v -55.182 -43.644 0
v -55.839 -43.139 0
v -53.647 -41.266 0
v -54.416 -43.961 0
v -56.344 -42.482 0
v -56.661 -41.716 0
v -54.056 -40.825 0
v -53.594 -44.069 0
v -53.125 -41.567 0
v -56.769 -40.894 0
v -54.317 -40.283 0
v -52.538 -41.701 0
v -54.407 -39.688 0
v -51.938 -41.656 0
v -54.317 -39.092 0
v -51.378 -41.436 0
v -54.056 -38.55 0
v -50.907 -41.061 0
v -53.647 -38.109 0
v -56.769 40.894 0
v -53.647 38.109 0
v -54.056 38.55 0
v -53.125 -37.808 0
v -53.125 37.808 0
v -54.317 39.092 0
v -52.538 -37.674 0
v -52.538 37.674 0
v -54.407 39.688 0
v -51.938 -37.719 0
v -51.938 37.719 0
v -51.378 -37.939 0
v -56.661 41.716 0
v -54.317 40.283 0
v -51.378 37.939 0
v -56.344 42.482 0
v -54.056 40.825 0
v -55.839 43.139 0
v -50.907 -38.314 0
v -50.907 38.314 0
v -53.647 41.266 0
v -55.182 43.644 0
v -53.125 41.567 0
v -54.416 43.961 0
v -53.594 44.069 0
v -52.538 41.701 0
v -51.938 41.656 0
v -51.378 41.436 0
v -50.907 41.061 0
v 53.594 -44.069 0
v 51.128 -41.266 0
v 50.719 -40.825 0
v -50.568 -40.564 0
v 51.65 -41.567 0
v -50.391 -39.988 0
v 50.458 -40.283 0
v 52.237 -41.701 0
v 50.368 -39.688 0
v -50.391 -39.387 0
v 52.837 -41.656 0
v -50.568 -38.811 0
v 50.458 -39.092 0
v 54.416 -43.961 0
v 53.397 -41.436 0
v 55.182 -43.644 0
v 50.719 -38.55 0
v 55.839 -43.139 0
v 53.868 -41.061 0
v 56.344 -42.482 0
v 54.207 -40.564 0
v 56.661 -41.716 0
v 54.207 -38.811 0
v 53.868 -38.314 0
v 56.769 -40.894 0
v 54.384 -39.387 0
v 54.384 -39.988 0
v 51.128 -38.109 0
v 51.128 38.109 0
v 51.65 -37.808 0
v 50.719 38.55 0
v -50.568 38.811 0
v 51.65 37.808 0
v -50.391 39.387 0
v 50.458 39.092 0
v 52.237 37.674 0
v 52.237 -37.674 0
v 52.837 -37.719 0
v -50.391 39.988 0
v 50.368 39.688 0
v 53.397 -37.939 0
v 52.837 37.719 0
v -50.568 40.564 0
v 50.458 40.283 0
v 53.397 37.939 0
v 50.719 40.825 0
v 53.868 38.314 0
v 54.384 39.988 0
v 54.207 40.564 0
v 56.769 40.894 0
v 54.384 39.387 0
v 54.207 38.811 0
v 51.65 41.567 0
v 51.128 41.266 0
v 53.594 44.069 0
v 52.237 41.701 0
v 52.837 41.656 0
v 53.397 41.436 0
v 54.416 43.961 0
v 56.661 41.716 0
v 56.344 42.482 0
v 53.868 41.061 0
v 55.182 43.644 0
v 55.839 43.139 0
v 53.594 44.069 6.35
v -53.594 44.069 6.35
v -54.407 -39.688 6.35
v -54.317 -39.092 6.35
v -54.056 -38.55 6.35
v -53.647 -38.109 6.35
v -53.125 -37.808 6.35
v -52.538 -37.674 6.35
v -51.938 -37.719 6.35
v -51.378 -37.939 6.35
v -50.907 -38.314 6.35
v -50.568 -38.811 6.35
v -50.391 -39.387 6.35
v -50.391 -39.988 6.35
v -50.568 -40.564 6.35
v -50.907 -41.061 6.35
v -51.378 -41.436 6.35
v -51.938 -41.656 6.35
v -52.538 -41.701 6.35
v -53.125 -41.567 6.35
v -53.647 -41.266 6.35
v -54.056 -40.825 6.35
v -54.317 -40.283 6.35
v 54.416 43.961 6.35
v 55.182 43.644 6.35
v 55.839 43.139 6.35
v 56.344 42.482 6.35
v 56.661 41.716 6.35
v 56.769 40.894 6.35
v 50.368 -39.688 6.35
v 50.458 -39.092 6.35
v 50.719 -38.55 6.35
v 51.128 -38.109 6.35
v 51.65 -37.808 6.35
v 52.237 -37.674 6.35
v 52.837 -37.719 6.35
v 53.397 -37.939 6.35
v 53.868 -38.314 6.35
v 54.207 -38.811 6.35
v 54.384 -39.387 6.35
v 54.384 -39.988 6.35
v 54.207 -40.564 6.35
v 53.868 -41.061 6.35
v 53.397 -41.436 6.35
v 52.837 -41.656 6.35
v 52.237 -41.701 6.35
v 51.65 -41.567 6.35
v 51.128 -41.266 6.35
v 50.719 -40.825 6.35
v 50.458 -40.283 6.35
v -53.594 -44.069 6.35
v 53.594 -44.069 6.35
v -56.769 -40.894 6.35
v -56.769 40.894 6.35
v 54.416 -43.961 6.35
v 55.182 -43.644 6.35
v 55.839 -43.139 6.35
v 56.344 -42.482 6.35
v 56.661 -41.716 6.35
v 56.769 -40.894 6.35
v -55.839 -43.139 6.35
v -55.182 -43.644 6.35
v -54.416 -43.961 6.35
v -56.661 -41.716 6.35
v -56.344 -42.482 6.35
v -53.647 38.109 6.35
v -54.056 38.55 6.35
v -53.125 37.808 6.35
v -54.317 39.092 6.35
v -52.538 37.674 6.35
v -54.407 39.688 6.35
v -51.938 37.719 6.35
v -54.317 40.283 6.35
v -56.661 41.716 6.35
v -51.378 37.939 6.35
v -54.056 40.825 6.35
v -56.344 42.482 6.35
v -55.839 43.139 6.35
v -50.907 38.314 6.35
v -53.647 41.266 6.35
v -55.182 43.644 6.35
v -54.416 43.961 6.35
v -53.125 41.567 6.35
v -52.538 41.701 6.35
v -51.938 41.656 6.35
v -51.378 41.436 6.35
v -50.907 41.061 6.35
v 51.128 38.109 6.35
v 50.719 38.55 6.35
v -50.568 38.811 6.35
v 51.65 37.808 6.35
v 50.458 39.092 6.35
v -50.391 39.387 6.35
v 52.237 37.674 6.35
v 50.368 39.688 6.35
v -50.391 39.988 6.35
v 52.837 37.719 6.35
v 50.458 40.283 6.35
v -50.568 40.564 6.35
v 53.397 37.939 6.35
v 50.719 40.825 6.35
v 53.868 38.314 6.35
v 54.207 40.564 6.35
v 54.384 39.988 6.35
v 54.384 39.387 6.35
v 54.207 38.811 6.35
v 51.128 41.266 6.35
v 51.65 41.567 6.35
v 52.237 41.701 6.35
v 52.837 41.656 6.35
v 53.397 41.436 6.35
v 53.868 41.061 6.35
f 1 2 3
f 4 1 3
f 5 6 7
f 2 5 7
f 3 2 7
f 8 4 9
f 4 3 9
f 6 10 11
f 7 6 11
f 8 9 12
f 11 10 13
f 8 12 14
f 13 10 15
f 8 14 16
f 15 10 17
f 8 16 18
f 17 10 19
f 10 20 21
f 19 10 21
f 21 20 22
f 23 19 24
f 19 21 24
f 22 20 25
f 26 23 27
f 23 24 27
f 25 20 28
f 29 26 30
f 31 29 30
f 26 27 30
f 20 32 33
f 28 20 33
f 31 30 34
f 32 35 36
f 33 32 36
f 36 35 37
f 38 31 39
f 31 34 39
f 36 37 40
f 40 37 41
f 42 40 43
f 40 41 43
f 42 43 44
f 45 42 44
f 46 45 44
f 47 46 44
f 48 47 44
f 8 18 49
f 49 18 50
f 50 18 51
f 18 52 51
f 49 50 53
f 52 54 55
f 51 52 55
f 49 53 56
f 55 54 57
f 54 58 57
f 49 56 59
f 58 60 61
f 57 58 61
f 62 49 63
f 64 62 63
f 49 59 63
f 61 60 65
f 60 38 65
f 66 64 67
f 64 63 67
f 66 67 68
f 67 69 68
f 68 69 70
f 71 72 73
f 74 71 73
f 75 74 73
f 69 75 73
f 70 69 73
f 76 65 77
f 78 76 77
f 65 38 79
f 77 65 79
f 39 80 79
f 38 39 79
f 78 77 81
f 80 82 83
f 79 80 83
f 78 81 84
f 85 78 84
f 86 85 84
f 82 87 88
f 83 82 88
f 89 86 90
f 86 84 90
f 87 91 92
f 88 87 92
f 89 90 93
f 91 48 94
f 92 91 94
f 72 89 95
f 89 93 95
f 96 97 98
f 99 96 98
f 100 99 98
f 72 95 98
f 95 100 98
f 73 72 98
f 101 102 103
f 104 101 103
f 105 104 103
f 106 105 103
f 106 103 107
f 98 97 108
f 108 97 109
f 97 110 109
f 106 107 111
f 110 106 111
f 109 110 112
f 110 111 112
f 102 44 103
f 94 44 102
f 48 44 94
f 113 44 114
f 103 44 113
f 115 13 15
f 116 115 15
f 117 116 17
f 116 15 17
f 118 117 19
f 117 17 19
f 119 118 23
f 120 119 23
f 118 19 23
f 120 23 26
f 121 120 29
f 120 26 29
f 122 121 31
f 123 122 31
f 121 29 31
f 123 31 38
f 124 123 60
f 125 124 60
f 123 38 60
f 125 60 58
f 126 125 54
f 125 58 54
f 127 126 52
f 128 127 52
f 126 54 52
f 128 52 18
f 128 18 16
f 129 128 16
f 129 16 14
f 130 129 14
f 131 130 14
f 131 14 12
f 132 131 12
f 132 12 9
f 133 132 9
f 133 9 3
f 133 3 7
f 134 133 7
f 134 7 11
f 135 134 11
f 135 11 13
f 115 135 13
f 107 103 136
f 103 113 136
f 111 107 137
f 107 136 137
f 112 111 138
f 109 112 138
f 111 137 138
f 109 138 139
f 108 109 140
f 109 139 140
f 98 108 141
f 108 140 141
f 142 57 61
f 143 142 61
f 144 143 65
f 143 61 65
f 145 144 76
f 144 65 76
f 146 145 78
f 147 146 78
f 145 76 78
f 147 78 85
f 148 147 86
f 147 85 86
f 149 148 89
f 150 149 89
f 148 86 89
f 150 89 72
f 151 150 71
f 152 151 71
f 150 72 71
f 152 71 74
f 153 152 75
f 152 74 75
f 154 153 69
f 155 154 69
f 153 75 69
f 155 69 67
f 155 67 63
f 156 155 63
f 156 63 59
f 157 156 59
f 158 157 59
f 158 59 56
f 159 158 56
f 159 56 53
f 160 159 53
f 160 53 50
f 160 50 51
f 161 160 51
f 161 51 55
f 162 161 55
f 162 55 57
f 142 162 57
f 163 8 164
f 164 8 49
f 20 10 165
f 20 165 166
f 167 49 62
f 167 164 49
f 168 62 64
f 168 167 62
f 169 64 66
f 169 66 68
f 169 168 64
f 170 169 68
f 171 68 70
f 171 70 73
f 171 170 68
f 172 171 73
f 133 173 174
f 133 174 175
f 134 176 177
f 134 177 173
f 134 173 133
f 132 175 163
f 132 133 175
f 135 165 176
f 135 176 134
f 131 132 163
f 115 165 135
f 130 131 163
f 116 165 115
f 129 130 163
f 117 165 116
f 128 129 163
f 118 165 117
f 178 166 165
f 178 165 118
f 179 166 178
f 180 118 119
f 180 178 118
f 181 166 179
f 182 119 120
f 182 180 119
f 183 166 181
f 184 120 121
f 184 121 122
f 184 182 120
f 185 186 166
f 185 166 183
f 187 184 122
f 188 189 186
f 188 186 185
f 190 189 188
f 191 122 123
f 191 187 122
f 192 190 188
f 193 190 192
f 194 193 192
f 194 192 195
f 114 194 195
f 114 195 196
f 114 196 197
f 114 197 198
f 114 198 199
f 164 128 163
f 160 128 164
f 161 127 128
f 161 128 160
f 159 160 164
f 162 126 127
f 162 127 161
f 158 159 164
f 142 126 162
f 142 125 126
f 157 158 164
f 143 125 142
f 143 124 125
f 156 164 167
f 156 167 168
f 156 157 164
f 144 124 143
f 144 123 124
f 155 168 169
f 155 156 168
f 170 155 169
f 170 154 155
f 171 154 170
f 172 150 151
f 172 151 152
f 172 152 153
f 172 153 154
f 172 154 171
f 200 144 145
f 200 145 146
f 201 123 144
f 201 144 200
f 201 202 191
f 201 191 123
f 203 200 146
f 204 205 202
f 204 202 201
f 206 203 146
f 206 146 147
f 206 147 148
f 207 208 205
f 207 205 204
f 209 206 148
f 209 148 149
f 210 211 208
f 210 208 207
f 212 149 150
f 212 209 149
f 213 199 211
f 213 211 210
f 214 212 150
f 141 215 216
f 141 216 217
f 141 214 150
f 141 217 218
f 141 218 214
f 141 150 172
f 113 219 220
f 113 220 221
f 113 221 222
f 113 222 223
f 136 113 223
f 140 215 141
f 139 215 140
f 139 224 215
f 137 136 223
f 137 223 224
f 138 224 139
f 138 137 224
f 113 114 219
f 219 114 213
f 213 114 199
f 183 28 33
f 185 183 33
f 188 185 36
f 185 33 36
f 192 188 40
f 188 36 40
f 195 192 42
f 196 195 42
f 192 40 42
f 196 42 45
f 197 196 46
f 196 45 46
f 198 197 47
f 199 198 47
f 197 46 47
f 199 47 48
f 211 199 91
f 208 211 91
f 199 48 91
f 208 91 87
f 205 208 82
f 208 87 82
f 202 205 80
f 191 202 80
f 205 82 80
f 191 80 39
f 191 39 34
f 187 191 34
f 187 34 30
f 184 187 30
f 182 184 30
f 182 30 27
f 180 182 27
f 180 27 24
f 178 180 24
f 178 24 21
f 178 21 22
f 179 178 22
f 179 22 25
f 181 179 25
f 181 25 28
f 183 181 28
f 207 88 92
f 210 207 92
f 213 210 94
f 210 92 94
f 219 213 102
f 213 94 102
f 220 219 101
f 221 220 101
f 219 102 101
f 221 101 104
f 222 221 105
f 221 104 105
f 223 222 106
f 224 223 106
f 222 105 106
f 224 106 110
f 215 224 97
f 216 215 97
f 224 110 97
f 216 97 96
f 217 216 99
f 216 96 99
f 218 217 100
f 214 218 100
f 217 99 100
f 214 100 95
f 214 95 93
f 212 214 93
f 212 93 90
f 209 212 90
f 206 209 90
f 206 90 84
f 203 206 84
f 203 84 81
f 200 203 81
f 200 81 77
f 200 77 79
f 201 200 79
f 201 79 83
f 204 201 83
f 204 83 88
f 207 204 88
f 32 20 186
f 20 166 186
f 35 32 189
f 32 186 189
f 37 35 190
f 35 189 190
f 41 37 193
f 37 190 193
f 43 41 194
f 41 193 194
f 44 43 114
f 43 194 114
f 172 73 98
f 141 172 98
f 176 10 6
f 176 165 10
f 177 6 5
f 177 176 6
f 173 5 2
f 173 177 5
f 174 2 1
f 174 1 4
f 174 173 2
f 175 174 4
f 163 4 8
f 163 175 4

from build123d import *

# Parameters (mm, degrees)
SKETCH1_W                 = 113.538
SKETCH1_H                 = 88.138
EXTRUDE1_DEPTH            = 6.35
F_8_CLEARANCE_HOLE1_D     = 4.0386
F_8_CLEARANCE_HOLE1_DEPTH = 6.35
FILLET2_R                 = 3.175


with BuildPart() as part:
    # Sketch1 → Extrude1 (new body)
    with BuildSketch(Plane.XY):
        Rectangle(SKETCH1_W, SKETCH1_H)
    extrude(amount=EXTRUDE1_DEPTH)

    # #8 Clearance Hole1
    with Locations(Plane(origin=(-52.3875, 39.6875, 6.35), x_dir=(1, 0, 0), z_dir=(0, 0, 1))):
        with Locations((0, 0), (104.775, 0), (104.775, -79.375), (0, -79.375)):
            Hole(F_8_CLEARANCE_HOLE1_D / 2, depth=F_8_CLEARANCE_HOLE1_DEPTH)

    # Fillet2
    fillet2_edges = [part.edges().sort_by_distance(p)[0] for p in [
        (-56.769, 44.069, 3.175),
        (56.769, 44.069, 3.175),
        (56.769, -44.069, 3.175),
        (-56.769, -44.069, 3.175),
    ]]
    fillet(fillet2_edges, radius=FILLET2_R)


solid = part.part
